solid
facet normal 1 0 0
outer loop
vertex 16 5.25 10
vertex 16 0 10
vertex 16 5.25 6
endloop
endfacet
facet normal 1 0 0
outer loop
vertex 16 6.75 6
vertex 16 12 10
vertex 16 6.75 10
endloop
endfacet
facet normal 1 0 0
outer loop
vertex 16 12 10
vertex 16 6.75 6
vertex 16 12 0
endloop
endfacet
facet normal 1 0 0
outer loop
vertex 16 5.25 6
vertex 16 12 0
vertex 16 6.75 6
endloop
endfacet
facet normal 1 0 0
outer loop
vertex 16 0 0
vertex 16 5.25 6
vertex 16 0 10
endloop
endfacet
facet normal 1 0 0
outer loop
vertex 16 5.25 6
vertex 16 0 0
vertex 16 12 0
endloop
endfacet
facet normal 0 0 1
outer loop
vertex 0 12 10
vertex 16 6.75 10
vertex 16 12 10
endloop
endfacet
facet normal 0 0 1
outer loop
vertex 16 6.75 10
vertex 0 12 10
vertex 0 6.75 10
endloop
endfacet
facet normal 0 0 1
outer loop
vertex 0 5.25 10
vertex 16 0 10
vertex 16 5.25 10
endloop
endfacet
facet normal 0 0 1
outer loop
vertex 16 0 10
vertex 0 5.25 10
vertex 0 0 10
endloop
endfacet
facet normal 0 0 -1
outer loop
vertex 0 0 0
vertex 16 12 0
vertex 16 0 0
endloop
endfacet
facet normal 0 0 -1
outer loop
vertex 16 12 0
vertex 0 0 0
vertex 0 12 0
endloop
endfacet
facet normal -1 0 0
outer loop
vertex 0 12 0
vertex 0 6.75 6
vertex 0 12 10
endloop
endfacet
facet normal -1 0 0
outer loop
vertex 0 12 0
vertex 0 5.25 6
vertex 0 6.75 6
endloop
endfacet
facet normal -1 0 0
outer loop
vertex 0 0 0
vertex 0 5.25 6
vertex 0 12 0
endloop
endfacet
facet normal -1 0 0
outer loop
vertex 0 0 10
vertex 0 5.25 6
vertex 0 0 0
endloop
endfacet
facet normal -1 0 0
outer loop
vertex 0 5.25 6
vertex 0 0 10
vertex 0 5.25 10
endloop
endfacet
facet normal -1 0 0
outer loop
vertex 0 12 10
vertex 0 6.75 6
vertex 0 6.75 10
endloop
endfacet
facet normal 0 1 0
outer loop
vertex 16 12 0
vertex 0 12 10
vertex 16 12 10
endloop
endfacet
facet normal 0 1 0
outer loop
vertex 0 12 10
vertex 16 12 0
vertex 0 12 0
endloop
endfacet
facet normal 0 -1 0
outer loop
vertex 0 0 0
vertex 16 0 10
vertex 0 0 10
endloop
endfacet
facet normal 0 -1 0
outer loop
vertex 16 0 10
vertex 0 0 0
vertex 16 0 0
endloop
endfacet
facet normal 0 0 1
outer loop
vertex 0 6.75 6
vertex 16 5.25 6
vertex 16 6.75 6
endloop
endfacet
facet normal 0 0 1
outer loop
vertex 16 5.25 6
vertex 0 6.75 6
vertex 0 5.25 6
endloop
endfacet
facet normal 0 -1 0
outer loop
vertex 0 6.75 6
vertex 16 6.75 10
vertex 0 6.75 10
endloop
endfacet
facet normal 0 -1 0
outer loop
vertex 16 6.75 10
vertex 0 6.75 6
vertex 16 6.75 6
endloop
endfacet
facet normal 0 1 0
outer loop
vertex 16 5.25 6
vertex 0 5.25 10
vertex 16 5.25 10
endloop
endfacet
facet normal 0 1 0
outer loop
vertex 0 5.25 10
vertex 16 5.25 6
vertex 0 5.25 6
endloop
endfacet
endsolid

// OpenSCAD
$fn = 32;

// ----------------------------------------------------------------------
// Micro clip: slotted block, 5-20 mm class
// ----------------------------------------------------------------------

// --- parameters (mm) ---
block_l = 16;             // block length, X
block_w = 12;             // block width, Y
block_h = 10;             // block height, Z
slot_w = 1.5;             // slot width
slot_d = 4;               // slot depth from the top
fit_tol = 0.05;           // tolerance for press fits, mm
free_tol = 0.3;           // tolerance for clearance fits, mm

difference() {
  cube([block_l, block_w, block_h]);
  translate([-1, block_w / 2 - slot_w / 2, block_h - slot_d])
    cube([block_l + 2, slot_w, slot_d + 1]);
}
